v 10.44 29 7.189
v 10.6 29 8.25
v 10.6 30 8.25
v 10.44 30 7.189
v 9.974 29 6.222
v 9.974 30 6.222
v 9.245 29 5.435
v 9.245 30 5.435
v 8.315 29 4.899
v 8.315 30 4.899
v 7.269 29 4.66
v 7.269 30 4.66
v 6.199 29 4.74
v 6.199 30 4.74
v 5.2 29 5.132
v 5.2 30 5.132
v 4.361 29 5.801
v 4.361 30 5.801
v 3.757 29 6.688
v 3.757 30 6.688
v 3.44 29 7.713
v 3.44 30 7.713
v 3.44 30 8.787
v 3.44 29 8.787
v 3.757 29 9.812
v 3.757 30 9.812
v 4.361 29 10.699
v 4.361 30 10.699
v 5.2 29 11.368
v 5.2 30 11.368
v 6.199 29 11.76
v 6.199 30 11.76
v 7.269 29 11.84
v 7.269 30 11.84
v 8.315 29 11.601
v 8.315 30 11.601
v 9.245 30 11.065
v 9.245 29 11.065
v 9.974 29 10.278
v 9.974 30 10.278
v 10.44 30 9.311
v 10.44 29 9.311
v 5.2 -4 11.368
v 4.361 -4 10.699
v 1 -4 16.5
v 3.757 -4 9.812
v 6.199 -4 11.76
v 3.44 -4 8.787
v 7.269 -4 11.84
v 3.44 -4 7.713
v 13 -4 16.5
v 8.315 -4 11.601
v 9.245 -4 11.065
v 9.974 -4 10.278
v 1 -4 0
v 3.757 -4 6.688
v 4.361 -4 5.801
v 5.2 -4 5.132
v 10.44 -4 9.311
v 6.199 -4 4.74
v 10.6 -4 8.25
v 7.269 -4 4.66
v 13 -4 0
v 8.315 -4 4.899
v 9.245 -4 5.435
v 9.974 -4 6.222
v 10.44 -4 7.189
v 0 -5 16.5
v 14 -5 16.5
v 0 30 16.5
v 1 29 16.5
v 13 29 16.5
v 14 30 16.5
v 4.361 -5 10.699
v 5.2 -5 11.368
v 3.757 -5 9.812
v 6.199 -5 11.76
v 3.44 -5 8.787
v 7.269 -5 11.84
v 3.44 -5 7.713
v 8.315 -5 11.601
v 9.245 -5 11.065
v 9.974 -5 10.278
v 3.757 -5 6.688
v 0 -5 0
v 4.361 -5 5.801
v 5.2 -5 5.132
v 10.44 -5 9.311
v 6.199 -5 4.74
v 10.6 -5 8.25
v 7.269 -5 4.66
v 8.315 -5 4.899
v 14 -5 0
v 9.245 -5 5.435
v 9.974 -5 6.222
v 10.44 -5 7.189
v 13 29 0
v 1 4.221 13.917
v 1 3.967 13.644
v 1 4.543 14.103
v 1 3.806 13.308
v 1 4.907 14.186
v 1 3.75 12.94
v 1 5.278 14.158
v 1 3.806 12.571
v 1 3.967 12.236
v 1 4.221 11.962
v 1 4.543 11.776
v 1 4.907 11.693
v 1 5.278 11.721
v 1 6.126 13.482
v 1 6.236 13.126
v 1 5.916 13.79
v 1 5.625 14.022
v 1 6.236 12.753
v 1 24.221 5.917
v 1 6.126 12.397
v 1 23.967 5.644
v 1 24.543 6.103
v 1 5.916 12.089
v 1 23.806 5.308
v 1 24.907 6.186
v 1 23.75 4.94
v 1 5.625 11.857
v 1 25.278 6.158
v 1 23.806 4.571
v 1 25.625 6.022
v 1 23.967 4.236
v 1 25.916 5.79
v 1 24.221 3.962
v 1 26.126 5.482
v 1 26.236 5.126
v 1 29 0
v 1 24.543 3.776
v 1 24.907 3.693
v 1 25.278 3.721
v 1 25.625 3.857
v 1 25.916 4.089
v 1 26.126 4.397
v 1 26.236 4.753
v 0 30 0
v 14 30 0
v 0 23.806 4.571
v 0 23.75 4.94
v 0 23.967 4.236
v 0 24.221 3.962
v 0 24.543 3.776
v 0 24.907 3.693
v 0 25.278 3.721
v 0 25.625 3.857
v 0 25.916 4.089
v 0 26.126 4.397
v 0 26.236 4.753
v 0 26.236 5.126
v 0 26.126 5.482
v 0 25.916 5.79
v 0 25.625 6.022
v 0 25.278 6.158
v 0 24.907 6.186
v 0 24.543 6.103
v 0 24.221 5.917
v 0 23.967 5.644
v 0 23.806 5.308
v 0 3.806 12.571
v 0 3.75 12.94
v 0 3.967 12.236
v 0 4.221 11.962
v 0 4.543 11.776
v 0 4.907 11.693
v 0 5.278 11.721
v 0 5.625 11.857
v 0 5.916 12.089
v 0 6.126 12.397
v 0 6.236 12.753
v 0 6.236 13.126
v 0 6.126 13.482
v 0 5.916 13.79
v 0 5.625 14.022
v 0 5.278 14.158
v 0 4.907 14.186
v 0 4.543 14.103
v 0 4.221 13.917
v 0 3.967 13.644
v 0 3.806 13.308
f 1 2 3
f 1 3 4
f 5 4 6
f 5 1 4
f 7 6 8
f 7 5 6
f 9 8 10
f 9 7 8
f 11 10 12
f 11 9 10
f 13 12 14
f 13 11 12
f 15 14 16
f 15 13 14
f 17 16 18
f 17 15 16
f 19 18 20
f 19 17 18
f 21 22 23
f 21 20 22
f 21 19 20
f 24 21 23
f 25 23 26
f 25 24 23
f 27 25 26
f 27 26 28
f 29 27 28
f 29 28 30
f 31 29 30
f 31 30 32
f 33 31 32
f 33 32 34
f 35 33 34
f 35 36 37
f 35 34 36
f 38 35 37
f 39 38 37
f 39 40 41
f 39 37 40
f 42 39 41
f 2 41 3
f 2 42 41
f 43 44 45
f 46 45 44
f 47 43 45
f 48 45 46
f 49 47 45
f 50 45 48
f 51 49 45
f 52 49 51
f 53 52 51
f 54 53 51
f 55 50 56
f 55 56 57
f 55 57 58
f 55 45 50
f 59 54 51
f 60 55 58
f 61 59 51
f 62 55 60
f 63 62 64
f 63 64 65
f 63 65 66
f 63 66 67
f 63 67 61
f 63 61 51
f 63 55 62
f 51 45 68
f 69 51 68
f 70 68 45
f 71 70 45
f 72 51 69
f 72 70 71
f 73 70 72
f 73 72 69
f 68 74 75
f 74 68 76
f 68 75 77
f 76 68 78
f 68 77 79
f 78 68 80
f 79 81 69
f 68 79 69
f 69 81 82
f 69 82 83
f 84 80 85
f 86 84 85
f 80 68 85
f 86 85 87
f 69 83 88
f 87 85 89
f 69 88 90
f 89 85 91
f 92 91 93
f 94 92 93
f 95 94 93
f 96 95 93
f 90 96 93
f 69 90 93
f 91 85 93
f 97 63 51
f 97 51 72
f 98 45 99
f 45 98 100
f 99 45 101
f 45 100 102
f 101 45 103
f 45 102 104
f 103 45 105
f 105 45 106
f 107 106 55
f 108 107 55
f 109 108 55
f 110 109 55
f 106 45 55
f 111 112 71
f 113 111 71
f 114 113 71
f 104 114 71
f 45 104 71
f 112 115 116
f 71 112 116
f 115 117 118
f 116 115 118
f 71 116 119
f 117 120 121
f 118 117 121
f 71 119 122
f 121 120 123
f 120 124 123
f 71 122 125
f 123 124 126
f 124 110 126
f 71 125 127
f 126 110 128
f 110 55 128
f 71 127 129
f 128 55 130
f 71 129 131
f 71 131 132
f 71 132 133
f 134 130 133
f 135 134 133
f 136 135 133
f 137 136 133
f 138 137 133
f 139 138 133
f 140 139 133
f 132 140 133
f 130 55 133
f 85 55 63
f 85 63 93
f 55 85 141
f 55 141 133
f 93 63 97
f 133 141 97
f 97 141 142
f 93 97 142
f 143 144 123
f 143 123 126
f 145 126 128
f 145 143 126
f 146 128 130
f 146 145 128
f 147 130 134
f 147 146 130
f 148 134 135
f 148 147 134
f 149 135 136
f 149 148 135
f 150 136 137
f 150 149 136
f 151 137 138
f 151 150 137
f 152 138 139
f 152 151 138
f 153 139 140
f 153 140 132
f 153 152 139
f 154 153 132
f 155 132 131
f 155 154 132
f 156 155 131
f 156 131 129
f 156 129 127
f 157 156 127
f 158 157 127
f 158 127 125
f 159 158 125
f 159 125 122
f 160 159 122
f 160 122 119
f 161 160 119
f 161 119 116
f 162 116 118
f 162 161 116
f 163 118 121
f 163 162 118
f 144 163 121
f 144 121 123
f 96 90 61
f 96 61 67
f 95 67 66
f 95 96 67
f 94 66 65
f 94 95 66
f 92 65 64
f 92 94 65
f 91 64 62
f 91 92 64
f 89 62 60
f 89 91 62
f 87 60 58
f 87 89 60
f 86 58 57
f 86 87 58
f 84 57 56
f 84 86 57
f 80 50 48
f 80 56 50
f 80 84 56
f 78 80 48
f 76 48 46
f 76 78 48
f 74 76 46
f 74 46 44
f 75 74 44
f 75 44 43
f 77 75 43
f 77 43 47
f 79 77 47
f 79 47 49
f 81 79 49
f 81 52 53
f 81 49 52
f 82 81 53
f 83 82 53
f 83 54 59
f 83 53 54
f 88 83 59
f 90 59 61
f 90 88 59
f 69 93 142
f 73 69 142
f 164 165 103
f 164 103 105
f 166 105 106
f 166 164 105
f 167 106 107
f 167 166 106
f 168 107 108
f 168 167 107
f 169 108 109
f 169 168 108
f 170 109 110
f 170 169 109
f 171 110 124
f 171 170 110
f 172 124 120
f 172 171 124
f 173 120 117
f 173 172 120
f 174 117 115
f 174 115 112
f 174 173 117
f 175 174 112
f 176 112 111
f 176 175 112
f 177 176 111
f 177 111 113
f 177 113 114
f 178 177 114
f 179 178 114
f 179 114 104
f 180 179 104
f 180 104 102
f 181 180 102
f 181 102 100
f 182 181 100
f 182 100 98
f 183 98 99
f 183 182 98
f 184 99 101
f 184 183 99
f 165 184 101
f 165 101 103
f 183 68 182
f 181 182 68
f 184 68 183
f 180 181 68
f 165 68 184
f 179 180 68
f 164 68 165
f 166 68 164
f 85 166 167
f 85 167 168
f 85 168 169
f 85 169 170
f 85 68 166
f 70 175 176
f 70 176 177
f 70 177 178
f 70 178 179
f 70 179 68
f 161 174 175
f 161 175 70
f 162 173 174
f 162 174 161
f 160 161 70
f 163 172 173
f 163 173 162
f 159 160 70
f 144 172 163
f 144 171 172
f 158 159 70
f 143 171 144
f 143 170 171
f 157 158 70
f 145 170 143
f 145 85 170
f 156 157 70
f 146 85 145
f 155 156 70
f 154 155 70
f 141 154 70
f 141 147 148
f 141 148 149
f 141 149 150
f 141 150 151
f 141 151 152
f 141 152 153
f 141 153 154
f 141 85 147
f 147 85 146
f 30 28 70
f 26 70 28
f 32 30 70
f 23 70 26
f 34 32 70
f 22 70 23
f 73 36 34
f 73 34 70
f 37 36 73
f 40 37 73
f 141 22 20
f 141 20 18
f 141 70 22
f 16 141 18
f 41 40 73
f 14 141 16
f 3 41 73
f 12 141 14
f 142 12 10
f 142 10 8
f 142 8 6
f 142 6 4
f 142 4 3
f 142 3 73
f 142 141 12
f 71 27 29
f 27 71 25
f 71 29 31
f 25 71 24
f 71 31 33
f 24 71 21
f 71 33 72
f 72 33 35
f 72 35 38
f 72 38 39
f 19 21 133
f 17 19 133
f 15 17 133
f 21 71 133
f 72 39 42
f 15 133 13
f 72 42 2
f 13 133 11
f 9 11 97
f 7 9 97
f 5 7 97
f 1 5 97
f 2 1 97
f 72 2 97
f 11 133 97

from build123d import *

# Parameters (mm, degrees)
SKETCH1_W               = 14
SKETCH1_H               = 35
BOSS_EXTRUDE1_DEPTH     = 16.5
CUT_EXTRUDE3_DEPTH      = 37.989863476
CUT_EXTRUDE3_DEPTH_BACK = 37.989863476
SKETCH3_OUTSIDE_W       = 24.23
SKETCH3_OUTSIDE_H       = 45.23
SKETCH3_OUTSIDE_W_2     = 14
SKETCH3_OUTSIDE_H_2     = 35
SKETCH3_OUTSIDE_W_3     = 12
SKETCH3_OUTSIDE_H_3     = 33
CUT_EXTRUDE4_DEPTH      = 37.989863476
CUT_EXTRUDE4_DEPTH_BACK = 40.5
SKETCH4_R               = 3.6
SKETCH5_R               = 1.25
CUT_EXTRUDE6_DEPTH      = 1


with BuildPart() as part:
    # Sketch1 → Boss-Extrude1 (new body)
    with BuildSketch(Plane.XY):
        with Locations((7, 12.5)):
            Rectangle(SKETCH1_W, SKETCH1_H)
    extrude(amount=BOSS_EXTRUDE1_DEPTH)

    # Sketch3 outside → Cut-Extrude3 (cut, two sides: drawn at the far end of the back side and taken through both)
    # profile 1 of 2: a face of its own
    with BuildSketch(Plane.XY.offset(-CUT_EXTRUDE3_DEPTH_BACK)):
        with Locations((7, 12.5)):
            Rectangle(SKETCH3_OUTSIDE_W, SKETCH3_OUTSIDE_H)
        with Locations((7, 12.5)):
            Rectangle(SKETCH3_OUTSIDE_W_2, SKETCH3_OUTSIDE_H_2, mode=Mode.SUBTRACT)
    # profile 2 of 2: a face of its own
    with BuildSketch(Plane.XY.offset(-CUT_EXTRUDE3_DEPTH_BACK)):
        with Locations((7, 12.5)):
            Rectangle(SKETCH3_OUTSIDE_W_3, SKETCH3_OUTSIDE_H_3)
    extrude(amount=CUT_EXTRUDE3_DEPTH + CUT_EXTRUDE3_DEPTH_BACK, mode=Mode.SUBTRACT)

    # Sketch4 → Cut-Extrude4 (cut, two sides: drawn at the far end of the back side and taken through both)
    with BuildSketch(Plane(origin=(0, 0, 0), x_dir=(1, 0, 0), z_dir=(0, 1, 0)).offset(-CUT_EXTRUDE4_DEPTH_BACK)):
        with Locations((7, -8.25)):
            Circle(SKETCH4_R)
    extrude(amount=CUT_EXTRUDE4_DEPTH + CUT_EXTRUDE4_DEPTH_BACK, mode=Mode.SUBTRACT)

    # Sketch5 → Cut-Extrude6 (cut)
    with BuildSketch(Plane(origin=(0, 0, 0), x_dir=(0, 0, -1), z_dir=(1, 0, 0))):
        with Locations(Location((-4.939666778, 25, 0), (0, 0, 270))):
            Circle(SKETCH5_R)
        with Locations(Location((-12.939666778, 5, 0), (0, 0, 270))):
            Circle(SKETCH5_R)
    extrude(amount=CUT_EXTRUDE6_DEPTH, mode=Mode.SUBTRACT)


solid = part.part
